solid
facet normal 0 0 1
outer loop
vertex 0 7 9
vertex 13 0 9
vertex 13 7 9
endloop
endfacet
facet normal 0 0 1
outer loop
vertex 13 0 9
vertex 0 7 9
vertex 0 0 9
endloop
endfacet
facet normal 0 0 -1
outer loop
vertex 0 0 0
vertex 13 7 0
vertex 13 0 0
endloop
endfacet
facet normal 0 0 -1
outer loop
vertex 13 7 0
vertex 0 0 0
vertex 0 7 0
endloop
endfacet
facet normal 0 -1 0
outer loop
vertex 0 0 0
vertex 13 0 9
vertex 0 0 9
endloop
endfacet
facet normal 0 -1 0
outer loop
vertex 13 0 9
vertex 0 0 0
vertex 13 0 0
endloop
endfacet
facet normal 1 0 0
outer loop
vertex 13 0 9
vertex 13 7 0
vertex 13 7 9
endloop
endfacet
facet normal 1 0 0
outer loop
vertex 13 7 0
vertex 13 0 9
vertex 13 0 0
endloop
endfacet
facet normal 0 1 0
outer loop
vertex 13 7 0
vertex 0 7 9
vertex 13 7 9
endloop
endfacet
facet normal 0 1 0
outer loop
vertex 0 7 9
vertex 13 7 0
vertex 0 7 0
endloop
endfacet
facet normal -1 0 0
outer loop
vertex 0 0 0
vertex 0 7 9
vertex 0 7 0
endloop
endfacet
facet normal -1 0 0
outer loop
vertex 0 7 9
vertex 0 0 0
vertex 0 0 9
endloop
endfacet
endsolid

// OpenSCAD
// Generated by SolidPython 1.0.1 on 2020-07-29 00:46:55


cube(size = [13, 7, 9]);
/***********************************************
*********      SolidPython code:      **********
************************************************
 
# import packages: SolidPython
from solid import *
from solid.utils import *
from itertools import chain, combinations, permutations


class Resize:

    def __init__(self, scad_file):
        self.scad_file = scad_file
        #self.scad_file = import_scad(scad_file)
        # cone/cylinder param:
        self.r1 = 0
        self.r2 = 0
        self.h = 0
        # rectangular prism param:
        self.w = 0
        self.l = 0
        # ellipse param:
        self.r = 0

    # import OpenScad code (file name corresponds to shape)


    # classify shape + parameters
    def assign(self, param1, param2, param3):
        if self.scad_file == 'cone.scad':
            self.r1 = param1
            self.r2 = param2
            self.h = param3
        elif self.scad_file == 'cylinder.scad':
            self.r1 = param1
            self.r2 = param2
            self.h = param3
        elif self.scad_file == 'rectangularPrism.scad':
            self.h = param1
            self.l = param2
            self.w = param3
        else:
            self.r = param1
            self.h = param2

    # resize parameters
    def iterate(self):
        x = range(3, 20, 2)
        i = 1
        if self.scad_file == 'cone.scad':
            tempList = list(permutations(x, 2))
            for temp in tempList:
                param1 = temp[0]
                param2 = temp[1]
                filepath = 'produced_scad_files/' + 'cone' + str(param1) + '_' + str(param2) + '_' + '.scad'
                scad_render_to_file(cylinder(h=param1, r1=param2, r2=0), filepath)

        elif self.scad_file == 'cylinder.scad':
            tempList = list(permutations(x, 3))
            for temp in tempList:
                param1 = temp[0]
                param2 = temp[1]
                filepath = 'produced_scad_files/' + 'cylinder' + str(param1) + '_' + str(param2) + '_' + '.scad'
                scad_render_to_file(cylinder(h=param1, r1=param2, r2=param2), filepath)

        elif self.scad_file == 'rectangularPrism.scad':
            tempList = list(permutations(x, 3))
            for temp in tempList:
                param1 = temp[0]
                param2 = temp[1]
                param3 = temp[2]
                filepath = 'produced_scad_files/' + 'rectangularPrism' + str(param1) + '_' + str(param2) + '_' + str(
                    param3) + '.scad'
                scad_render_to_file(cube(size=(param1, param2, param3)), filepath)

        elif self.scad_file == 'ellipse.scad':
            tempList = list(permutations(x, 4))
            for temp in tempList:
                param1 = temp[0]
                param2 = temp[1]
                param3 = temp[2]
                param4 = temp[3]
                filepath = 'produced_scad_files/' + 'ellipse' + str(param1) + '_' + str(param2) + '_' + str(param3) + '_' + str(param4) + '.scad'
                scad_render_to_file(scale([param1, param2, param3])(sphere(r=param4)), filepath)

    def render_to_scadfile(self):
        scad_render_to_file(scad, 'example.scad') 
 
************************************************/
